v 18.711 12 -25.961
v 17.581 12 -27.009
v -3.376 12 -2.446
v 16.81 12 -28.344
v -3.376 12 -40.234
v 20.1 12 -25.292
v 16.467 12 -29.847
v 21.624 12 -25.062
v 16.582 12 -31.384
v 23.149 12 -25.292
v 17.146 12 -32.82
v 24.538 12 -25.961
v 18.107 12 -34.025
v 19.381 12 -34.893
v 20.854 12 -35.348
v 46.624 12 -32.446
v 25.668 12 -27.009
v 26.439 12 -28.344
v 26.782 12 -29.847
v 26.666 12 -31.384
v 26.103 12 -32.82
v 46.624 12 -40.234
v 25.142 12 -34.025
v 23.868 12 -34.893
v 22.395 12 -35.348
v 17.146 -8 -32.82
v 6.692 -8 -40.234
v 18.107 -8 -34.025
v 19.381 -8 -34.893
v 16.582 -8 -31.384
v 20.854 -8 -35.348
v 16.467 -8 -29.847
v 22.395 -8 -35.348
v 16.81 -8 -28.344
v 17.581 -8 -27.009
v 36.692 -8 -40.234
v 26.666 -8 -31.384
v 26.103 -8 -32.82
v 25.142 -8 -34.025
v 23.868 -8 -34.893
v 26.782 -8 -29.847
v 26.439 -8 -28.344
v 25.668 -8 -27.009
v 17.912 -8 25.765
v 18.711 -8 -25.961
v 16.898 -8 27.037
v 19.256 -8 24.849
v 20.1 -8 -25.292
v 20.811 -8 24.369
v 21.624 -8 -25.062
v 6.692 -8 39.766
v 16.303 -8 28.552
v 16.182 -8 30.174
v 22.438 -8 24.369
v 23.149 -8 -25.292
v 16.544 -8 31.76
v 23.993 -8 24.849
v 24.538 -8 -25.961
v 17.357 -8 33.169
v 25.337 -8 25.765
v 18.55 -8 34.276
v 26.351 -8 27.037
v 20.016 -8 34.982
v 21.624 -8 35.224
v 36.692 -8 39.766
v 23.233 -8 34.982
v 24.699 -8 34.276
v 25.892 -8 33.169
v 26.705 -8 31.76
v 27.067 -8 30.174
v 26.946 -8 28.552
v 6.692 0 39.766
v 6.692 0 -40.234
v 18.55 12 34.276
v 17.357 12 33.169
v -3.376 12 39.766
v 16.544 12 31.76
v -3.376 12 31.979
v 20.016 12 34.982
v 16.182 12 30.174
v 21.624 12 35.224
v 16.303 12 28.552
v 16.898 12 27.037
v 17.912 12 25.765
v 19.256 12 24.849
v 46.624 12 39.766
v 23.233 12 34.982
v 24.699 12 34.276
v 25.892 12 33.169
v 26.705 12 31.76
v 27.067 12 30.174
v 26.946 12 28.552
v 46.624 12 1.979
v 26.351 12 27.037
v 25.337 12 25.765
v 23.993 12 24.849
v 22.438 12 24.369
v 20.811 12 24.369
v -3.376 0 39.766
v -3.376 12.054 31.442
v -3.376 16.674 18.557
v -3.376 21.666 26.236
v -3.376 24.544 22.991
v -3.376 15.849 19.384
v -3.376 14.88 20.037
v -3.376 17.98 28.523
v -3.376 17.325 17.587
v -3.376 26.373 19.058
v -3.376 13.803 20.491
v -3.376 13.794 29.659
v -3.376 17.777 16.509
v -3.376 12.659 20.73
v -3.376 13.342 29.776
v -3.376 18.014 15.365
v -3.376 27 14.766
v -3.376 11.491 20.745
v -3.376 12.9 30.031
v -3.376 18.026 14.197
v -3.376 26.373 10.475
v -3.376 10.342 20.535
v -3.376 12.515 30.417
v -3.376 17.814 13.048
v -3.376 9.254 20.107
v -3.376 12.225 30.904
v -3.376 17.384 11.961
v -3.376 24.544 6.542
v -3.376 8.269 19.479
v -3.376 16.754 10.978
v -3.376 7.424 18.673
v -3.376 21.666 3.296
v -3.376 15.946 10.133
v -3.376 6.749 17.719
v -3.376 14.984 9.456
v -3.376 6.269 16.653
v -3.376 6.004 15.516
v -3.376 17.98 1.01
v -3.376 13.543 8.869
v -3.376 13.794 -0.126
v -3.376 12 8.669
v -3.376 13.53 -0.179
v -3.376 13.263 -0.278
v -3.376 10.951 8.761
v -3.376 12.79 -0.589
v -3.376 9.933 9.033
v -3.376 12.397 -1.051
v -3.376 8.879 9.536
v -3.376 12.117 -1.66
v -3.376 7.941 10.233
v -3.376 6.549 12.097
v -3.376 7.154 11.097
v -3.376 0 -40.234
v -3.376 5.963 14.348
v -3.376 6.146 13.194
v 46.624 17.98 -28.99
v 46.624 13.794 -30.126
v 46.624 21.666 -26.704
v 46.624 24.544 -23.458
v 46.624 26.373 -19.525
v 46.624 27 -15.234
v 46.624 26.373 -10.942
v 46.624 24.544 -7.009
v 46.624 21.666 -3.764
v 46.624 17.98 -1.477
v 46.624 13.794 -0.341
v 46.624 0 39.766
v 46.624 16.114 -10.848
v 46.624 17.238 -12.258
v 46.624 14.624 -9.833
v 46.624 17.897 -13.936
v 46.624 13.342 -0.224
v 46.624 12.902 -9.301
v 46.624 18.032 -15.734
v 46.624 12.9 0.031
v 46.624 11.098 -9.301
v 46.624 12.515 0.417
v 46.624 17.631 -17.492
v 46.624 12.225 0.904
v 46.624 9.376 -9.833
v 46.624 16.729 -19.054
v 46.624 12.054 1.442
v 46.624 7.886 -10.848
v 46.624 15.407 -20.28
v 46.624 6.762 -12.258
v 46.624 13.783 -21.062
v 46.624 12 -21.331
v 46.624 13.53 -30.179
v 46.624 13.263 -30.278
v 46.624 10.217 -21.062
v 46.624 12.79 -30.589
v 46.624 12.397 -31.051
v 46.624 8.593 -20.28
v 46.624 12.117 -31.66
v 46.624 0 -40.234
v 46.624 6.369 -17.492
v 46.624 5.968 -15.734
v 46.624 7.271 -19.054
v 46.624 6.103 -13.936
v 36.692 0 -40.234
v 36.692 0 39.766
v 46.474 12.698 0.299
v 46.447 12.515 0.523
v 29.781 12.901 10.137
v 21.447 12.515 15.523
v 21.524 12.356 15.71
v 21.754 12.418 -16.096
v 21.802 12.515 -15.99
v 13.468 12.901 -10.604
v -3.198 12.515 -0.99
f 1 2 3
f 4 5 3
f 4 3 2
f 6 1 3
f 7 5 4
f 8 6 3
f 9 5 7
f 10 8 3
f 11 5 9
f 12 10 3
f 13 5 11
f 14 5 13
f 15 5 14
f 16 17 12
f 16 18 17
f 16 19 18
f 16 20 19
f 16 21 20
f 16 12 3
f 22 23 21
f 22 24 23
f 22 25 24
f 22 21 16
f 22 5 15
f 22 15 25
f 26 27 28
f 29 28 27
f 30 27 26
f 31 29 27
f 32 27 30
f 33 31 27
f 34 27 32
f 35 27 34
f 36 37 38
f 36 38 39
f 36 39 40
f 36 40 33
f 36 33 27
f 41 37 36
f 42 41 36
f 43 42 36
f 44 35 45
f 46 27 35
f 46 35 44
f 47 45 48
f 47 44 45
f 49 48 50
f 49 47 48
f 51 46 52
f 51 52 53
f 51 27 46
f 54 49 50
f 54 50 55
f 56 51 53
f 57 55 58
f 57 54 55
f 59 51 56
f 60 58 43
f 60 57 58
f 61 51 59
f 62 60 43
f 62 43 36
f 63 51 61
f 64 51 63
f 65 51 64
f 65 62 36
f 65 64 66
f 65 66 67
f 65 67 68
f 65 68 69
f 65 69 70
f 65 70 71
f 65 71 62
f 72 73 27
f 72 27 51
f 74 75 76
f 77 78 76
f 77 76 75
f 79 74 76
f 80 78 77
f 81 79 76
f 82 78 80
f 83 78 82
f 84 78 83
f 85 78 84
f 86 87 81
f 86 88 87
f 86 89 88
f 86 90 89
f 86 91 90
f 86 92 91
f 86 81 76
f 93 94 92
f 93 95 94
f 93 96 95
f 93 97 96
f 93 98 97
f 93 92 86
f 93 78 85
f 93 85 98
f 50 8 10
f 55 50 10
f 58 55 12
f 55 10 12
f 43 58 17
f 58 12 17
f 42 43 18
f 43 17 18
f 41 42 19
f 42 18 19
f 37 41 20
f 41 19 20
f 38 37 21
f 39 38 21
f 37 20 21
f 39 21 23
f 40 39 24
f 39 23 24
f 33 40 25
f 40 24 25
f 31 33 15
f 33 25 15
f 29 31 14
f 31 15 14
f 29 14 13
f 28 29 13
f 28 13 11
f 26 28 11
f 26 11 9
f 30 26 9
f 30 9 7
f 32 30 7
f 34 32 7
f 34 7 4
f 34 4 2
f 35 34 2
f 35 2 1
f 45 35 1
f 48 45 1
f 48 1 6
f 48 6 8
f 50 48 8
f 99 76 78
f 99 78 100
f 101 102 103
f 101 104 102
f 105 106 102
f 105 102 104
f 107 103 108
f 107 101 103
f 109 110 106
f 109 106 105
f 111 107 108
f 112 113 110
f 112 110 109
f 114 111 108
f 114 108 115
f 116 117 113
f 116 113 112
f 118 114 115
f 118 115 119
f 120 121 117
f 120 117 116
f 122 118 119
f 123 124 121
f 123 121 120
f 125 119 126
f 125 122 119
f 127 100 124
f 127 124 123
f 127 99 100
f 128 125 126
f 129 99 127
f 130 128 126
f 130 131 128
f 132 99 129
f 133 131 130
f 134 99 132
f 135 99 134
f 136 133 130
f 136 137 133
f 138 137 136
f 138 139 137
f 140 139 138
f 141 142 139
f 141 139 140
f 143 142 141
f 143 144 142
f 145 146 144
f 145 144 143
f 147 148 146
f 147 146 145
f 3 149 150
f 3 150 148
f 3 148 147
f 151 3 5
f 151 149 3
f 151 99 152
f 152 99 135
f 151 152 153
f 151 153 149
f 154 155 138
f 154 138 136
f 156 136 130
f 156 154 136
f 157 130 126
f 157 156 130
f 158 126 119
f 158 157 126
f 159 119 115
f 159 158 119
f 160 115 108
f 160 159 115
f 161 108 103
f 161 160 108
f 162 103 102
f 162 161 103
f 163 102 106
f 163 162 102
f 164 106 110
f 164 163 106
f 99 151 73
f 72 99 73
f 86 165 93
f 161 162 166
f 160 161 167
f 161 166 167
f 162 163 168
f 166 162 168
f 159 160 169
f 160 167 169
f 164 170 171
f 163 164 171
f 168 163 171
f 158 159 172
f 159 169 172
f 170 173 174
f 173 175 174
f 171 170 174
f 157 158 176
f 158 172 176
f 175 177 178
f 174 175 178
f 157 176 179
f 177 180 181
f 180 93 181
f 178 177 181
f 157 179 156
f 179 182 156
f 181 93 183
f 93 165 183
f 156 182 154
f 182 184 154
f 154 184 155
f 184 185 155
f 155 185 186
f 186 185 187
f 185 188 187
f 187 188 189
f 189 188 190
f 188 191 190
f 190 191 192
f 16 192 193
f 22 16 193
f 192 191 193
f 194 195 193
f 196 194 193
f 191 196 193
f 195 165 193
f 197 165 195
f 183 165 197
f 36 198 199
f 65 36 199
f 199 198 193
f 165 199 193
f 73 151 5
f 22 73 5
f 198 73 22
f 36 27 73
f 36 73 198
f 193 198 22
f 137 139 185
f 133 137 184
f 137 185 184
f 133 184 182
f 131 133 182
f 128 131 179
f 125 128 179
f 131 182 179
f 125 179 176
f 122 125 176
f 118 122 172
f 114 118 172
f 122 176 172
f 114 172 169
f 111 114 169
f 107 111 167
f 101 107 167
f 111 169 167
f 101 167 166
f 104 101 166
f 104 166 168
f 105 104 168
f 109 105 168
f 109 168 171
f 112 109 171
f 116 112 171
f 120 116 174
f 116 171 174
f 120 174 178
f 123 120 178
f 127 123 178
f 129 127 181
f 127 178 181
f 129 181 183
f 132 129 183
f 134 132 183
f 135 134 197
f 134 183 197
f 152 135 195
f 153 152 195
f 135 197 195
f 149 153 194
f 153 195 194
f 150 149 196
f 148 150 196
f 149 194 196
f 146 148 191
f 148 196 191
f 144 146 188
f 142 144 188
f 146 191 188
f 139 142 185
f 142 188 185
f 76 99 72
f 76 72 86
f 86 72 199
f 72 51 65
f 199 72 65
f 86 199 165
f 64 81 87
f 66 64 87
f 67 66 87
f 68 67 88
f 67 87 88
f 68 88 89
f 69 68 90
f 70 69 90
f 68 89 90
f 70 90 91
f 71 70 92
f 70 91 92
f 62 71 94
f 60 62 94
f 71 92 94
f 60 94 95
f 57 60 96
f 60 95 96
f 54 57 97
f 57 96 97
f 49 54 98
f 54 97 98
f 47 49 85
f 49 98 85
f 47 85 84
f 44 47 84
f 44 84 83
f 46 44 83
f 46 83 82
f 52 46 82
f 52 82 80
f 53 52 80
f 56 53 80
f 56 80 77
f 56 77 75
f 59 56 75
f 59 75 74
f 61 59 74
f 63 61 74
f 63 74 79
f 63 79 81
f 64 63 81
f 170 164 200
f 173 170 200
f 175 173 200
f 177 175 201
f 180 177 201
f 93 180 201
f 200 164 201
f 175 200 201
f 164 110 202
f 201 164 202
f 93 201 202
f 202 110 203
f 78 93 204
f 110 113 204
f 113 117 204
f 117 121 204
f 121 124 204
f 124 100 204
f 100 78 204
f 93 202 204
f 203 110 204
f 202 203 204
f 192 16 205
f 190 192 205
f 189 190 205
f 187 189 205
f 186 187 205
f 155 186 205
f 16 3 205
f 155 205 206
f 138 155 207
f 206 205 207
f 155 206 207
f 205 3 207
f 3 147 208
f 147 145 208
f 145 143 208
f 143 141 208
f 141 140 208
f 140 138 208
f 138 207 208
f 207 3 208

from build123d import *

# Parameters (mm, degrees)
IZIM2_W                     = 50
IZIM2_H                     = 80
Y_KSEKLIK_EKSTR_ZYON1_DEPTH = 12
IZIM7_W                     = 30
IZIM7_H                     = 80
Y_KSEKLIK_EKSTR_ZYON2_DEPTH = 8
Y_KSEKLIK_EKSTR_ZYON3_DEPTH = 58.309518948
IZIM9_R                     = 6.04863379
KES_EKSTR_ZYON2_DEPTH       = 69
RADYUS1_R                   = 2
IZIM10_R                    = 5.458003929
IZIM10_R_2                  = 5.171696766
KES_EKSTR_ZYON3_DEPTH       = 69


with BuildPart() as part:
    # Çizim2 → Yükseklik-Ekstrüzyon1 (new body)
    with BuildSketch(Plane(origin=(0, 0, 0), x_dir=(1, 0, 0), z_dir=(0, 1, 0))):
        with Locations((21.624459622, 0.233673548)):
            Rectangle(IZIM2_W, IZIM2_H)
    extrude(amount=Y_KSEKLIK_EKSTR_ZYON1_DEPTH)

    # Çizim7 → Yükseklik-Ekstrüzyon2 (add)
    with BuildSketch(Plane.XZ):
        with Locations((21.691574622, -0.233673548)):
            Rectangle(IZIM7_W, IZIM7_H)
    extrude(amount=Y_KSEKLIK_EKSTR_ZYON2_DEPTH)

    # Çizim8 → Yükseklik-Ekstrüzyon3 (add, along a direction that is not the sketch's normal)
    with BuildSketch(Plane(origin=(46.624459622, 0, 0), x_dir=(0, 0, -1), z_dir=(1, 0, 0))):
        with BuildLine():
            Line((21.233673548, 12), (30.233673548, 12))
            ThreePointArc((30.233673548, 12), (15.233673548, 27), (0.233673548, 12))
            Line((0.233673548, 12), (9.233673548, 12))
            ThreePointArc((9.233673548, 12), (15.233673548, 18), (21.233673548, 12))
        make_face()
    extrude(amount=-Y_KSEKLIK_EKSTR_ZYON3_DEPTH, dir=(0.8574929257125442, 0, -0.5144957554275265))

    # Çizim9 → Kes-Ekstrüzyon2 (cut, along a direction that is not the sketch's normal)
    with BuildSketch(Plane(origin=(46.624459622, 0, 0), x_dir=(0, 0, -1), z_dir=(1, 0, 0))):
        with Locations((15.282307338, 12)):
            Circle(IZIM9_R)
    extrude(amount=-KES_EKSTR_ZYON2_DEPTH, dir=(0.8574929257125442, 0, -0.5144957554275265), mode=Mode.SUBTRACT)

    # Radyus1
    radyus1_edges = [part.edges().sort_by_distance(p)[0] for p in [
        (21.624459622, 12, 14.766326452),
        (21.624459622, 12, -15.233673548),
    ]]
    fillet(radyus1_edges, radius=RADYUS1_R)

    # Çizim10 → Kes-Ekstrüzyon3 (cut)
    with BuildSketch(Plane(origin=(0, 12, 0), x_dir=(1, 0, 0), z_dir=(0, 1, 0))):
        with Locations(Location((21.624459622, -29.766326452, 0), (0, 0, 270))):
            Circle(IZIM10_R)
        with Locations(Location((21.624459622, 30.233673548, 0), (0, 0, 270))):
            Circle(IZIM10_R_2)
    extrude(amount=-KES_EKSTR_ZYON3_DEPTH, mode=Mode.SUBTRACT)


solid = part.part
